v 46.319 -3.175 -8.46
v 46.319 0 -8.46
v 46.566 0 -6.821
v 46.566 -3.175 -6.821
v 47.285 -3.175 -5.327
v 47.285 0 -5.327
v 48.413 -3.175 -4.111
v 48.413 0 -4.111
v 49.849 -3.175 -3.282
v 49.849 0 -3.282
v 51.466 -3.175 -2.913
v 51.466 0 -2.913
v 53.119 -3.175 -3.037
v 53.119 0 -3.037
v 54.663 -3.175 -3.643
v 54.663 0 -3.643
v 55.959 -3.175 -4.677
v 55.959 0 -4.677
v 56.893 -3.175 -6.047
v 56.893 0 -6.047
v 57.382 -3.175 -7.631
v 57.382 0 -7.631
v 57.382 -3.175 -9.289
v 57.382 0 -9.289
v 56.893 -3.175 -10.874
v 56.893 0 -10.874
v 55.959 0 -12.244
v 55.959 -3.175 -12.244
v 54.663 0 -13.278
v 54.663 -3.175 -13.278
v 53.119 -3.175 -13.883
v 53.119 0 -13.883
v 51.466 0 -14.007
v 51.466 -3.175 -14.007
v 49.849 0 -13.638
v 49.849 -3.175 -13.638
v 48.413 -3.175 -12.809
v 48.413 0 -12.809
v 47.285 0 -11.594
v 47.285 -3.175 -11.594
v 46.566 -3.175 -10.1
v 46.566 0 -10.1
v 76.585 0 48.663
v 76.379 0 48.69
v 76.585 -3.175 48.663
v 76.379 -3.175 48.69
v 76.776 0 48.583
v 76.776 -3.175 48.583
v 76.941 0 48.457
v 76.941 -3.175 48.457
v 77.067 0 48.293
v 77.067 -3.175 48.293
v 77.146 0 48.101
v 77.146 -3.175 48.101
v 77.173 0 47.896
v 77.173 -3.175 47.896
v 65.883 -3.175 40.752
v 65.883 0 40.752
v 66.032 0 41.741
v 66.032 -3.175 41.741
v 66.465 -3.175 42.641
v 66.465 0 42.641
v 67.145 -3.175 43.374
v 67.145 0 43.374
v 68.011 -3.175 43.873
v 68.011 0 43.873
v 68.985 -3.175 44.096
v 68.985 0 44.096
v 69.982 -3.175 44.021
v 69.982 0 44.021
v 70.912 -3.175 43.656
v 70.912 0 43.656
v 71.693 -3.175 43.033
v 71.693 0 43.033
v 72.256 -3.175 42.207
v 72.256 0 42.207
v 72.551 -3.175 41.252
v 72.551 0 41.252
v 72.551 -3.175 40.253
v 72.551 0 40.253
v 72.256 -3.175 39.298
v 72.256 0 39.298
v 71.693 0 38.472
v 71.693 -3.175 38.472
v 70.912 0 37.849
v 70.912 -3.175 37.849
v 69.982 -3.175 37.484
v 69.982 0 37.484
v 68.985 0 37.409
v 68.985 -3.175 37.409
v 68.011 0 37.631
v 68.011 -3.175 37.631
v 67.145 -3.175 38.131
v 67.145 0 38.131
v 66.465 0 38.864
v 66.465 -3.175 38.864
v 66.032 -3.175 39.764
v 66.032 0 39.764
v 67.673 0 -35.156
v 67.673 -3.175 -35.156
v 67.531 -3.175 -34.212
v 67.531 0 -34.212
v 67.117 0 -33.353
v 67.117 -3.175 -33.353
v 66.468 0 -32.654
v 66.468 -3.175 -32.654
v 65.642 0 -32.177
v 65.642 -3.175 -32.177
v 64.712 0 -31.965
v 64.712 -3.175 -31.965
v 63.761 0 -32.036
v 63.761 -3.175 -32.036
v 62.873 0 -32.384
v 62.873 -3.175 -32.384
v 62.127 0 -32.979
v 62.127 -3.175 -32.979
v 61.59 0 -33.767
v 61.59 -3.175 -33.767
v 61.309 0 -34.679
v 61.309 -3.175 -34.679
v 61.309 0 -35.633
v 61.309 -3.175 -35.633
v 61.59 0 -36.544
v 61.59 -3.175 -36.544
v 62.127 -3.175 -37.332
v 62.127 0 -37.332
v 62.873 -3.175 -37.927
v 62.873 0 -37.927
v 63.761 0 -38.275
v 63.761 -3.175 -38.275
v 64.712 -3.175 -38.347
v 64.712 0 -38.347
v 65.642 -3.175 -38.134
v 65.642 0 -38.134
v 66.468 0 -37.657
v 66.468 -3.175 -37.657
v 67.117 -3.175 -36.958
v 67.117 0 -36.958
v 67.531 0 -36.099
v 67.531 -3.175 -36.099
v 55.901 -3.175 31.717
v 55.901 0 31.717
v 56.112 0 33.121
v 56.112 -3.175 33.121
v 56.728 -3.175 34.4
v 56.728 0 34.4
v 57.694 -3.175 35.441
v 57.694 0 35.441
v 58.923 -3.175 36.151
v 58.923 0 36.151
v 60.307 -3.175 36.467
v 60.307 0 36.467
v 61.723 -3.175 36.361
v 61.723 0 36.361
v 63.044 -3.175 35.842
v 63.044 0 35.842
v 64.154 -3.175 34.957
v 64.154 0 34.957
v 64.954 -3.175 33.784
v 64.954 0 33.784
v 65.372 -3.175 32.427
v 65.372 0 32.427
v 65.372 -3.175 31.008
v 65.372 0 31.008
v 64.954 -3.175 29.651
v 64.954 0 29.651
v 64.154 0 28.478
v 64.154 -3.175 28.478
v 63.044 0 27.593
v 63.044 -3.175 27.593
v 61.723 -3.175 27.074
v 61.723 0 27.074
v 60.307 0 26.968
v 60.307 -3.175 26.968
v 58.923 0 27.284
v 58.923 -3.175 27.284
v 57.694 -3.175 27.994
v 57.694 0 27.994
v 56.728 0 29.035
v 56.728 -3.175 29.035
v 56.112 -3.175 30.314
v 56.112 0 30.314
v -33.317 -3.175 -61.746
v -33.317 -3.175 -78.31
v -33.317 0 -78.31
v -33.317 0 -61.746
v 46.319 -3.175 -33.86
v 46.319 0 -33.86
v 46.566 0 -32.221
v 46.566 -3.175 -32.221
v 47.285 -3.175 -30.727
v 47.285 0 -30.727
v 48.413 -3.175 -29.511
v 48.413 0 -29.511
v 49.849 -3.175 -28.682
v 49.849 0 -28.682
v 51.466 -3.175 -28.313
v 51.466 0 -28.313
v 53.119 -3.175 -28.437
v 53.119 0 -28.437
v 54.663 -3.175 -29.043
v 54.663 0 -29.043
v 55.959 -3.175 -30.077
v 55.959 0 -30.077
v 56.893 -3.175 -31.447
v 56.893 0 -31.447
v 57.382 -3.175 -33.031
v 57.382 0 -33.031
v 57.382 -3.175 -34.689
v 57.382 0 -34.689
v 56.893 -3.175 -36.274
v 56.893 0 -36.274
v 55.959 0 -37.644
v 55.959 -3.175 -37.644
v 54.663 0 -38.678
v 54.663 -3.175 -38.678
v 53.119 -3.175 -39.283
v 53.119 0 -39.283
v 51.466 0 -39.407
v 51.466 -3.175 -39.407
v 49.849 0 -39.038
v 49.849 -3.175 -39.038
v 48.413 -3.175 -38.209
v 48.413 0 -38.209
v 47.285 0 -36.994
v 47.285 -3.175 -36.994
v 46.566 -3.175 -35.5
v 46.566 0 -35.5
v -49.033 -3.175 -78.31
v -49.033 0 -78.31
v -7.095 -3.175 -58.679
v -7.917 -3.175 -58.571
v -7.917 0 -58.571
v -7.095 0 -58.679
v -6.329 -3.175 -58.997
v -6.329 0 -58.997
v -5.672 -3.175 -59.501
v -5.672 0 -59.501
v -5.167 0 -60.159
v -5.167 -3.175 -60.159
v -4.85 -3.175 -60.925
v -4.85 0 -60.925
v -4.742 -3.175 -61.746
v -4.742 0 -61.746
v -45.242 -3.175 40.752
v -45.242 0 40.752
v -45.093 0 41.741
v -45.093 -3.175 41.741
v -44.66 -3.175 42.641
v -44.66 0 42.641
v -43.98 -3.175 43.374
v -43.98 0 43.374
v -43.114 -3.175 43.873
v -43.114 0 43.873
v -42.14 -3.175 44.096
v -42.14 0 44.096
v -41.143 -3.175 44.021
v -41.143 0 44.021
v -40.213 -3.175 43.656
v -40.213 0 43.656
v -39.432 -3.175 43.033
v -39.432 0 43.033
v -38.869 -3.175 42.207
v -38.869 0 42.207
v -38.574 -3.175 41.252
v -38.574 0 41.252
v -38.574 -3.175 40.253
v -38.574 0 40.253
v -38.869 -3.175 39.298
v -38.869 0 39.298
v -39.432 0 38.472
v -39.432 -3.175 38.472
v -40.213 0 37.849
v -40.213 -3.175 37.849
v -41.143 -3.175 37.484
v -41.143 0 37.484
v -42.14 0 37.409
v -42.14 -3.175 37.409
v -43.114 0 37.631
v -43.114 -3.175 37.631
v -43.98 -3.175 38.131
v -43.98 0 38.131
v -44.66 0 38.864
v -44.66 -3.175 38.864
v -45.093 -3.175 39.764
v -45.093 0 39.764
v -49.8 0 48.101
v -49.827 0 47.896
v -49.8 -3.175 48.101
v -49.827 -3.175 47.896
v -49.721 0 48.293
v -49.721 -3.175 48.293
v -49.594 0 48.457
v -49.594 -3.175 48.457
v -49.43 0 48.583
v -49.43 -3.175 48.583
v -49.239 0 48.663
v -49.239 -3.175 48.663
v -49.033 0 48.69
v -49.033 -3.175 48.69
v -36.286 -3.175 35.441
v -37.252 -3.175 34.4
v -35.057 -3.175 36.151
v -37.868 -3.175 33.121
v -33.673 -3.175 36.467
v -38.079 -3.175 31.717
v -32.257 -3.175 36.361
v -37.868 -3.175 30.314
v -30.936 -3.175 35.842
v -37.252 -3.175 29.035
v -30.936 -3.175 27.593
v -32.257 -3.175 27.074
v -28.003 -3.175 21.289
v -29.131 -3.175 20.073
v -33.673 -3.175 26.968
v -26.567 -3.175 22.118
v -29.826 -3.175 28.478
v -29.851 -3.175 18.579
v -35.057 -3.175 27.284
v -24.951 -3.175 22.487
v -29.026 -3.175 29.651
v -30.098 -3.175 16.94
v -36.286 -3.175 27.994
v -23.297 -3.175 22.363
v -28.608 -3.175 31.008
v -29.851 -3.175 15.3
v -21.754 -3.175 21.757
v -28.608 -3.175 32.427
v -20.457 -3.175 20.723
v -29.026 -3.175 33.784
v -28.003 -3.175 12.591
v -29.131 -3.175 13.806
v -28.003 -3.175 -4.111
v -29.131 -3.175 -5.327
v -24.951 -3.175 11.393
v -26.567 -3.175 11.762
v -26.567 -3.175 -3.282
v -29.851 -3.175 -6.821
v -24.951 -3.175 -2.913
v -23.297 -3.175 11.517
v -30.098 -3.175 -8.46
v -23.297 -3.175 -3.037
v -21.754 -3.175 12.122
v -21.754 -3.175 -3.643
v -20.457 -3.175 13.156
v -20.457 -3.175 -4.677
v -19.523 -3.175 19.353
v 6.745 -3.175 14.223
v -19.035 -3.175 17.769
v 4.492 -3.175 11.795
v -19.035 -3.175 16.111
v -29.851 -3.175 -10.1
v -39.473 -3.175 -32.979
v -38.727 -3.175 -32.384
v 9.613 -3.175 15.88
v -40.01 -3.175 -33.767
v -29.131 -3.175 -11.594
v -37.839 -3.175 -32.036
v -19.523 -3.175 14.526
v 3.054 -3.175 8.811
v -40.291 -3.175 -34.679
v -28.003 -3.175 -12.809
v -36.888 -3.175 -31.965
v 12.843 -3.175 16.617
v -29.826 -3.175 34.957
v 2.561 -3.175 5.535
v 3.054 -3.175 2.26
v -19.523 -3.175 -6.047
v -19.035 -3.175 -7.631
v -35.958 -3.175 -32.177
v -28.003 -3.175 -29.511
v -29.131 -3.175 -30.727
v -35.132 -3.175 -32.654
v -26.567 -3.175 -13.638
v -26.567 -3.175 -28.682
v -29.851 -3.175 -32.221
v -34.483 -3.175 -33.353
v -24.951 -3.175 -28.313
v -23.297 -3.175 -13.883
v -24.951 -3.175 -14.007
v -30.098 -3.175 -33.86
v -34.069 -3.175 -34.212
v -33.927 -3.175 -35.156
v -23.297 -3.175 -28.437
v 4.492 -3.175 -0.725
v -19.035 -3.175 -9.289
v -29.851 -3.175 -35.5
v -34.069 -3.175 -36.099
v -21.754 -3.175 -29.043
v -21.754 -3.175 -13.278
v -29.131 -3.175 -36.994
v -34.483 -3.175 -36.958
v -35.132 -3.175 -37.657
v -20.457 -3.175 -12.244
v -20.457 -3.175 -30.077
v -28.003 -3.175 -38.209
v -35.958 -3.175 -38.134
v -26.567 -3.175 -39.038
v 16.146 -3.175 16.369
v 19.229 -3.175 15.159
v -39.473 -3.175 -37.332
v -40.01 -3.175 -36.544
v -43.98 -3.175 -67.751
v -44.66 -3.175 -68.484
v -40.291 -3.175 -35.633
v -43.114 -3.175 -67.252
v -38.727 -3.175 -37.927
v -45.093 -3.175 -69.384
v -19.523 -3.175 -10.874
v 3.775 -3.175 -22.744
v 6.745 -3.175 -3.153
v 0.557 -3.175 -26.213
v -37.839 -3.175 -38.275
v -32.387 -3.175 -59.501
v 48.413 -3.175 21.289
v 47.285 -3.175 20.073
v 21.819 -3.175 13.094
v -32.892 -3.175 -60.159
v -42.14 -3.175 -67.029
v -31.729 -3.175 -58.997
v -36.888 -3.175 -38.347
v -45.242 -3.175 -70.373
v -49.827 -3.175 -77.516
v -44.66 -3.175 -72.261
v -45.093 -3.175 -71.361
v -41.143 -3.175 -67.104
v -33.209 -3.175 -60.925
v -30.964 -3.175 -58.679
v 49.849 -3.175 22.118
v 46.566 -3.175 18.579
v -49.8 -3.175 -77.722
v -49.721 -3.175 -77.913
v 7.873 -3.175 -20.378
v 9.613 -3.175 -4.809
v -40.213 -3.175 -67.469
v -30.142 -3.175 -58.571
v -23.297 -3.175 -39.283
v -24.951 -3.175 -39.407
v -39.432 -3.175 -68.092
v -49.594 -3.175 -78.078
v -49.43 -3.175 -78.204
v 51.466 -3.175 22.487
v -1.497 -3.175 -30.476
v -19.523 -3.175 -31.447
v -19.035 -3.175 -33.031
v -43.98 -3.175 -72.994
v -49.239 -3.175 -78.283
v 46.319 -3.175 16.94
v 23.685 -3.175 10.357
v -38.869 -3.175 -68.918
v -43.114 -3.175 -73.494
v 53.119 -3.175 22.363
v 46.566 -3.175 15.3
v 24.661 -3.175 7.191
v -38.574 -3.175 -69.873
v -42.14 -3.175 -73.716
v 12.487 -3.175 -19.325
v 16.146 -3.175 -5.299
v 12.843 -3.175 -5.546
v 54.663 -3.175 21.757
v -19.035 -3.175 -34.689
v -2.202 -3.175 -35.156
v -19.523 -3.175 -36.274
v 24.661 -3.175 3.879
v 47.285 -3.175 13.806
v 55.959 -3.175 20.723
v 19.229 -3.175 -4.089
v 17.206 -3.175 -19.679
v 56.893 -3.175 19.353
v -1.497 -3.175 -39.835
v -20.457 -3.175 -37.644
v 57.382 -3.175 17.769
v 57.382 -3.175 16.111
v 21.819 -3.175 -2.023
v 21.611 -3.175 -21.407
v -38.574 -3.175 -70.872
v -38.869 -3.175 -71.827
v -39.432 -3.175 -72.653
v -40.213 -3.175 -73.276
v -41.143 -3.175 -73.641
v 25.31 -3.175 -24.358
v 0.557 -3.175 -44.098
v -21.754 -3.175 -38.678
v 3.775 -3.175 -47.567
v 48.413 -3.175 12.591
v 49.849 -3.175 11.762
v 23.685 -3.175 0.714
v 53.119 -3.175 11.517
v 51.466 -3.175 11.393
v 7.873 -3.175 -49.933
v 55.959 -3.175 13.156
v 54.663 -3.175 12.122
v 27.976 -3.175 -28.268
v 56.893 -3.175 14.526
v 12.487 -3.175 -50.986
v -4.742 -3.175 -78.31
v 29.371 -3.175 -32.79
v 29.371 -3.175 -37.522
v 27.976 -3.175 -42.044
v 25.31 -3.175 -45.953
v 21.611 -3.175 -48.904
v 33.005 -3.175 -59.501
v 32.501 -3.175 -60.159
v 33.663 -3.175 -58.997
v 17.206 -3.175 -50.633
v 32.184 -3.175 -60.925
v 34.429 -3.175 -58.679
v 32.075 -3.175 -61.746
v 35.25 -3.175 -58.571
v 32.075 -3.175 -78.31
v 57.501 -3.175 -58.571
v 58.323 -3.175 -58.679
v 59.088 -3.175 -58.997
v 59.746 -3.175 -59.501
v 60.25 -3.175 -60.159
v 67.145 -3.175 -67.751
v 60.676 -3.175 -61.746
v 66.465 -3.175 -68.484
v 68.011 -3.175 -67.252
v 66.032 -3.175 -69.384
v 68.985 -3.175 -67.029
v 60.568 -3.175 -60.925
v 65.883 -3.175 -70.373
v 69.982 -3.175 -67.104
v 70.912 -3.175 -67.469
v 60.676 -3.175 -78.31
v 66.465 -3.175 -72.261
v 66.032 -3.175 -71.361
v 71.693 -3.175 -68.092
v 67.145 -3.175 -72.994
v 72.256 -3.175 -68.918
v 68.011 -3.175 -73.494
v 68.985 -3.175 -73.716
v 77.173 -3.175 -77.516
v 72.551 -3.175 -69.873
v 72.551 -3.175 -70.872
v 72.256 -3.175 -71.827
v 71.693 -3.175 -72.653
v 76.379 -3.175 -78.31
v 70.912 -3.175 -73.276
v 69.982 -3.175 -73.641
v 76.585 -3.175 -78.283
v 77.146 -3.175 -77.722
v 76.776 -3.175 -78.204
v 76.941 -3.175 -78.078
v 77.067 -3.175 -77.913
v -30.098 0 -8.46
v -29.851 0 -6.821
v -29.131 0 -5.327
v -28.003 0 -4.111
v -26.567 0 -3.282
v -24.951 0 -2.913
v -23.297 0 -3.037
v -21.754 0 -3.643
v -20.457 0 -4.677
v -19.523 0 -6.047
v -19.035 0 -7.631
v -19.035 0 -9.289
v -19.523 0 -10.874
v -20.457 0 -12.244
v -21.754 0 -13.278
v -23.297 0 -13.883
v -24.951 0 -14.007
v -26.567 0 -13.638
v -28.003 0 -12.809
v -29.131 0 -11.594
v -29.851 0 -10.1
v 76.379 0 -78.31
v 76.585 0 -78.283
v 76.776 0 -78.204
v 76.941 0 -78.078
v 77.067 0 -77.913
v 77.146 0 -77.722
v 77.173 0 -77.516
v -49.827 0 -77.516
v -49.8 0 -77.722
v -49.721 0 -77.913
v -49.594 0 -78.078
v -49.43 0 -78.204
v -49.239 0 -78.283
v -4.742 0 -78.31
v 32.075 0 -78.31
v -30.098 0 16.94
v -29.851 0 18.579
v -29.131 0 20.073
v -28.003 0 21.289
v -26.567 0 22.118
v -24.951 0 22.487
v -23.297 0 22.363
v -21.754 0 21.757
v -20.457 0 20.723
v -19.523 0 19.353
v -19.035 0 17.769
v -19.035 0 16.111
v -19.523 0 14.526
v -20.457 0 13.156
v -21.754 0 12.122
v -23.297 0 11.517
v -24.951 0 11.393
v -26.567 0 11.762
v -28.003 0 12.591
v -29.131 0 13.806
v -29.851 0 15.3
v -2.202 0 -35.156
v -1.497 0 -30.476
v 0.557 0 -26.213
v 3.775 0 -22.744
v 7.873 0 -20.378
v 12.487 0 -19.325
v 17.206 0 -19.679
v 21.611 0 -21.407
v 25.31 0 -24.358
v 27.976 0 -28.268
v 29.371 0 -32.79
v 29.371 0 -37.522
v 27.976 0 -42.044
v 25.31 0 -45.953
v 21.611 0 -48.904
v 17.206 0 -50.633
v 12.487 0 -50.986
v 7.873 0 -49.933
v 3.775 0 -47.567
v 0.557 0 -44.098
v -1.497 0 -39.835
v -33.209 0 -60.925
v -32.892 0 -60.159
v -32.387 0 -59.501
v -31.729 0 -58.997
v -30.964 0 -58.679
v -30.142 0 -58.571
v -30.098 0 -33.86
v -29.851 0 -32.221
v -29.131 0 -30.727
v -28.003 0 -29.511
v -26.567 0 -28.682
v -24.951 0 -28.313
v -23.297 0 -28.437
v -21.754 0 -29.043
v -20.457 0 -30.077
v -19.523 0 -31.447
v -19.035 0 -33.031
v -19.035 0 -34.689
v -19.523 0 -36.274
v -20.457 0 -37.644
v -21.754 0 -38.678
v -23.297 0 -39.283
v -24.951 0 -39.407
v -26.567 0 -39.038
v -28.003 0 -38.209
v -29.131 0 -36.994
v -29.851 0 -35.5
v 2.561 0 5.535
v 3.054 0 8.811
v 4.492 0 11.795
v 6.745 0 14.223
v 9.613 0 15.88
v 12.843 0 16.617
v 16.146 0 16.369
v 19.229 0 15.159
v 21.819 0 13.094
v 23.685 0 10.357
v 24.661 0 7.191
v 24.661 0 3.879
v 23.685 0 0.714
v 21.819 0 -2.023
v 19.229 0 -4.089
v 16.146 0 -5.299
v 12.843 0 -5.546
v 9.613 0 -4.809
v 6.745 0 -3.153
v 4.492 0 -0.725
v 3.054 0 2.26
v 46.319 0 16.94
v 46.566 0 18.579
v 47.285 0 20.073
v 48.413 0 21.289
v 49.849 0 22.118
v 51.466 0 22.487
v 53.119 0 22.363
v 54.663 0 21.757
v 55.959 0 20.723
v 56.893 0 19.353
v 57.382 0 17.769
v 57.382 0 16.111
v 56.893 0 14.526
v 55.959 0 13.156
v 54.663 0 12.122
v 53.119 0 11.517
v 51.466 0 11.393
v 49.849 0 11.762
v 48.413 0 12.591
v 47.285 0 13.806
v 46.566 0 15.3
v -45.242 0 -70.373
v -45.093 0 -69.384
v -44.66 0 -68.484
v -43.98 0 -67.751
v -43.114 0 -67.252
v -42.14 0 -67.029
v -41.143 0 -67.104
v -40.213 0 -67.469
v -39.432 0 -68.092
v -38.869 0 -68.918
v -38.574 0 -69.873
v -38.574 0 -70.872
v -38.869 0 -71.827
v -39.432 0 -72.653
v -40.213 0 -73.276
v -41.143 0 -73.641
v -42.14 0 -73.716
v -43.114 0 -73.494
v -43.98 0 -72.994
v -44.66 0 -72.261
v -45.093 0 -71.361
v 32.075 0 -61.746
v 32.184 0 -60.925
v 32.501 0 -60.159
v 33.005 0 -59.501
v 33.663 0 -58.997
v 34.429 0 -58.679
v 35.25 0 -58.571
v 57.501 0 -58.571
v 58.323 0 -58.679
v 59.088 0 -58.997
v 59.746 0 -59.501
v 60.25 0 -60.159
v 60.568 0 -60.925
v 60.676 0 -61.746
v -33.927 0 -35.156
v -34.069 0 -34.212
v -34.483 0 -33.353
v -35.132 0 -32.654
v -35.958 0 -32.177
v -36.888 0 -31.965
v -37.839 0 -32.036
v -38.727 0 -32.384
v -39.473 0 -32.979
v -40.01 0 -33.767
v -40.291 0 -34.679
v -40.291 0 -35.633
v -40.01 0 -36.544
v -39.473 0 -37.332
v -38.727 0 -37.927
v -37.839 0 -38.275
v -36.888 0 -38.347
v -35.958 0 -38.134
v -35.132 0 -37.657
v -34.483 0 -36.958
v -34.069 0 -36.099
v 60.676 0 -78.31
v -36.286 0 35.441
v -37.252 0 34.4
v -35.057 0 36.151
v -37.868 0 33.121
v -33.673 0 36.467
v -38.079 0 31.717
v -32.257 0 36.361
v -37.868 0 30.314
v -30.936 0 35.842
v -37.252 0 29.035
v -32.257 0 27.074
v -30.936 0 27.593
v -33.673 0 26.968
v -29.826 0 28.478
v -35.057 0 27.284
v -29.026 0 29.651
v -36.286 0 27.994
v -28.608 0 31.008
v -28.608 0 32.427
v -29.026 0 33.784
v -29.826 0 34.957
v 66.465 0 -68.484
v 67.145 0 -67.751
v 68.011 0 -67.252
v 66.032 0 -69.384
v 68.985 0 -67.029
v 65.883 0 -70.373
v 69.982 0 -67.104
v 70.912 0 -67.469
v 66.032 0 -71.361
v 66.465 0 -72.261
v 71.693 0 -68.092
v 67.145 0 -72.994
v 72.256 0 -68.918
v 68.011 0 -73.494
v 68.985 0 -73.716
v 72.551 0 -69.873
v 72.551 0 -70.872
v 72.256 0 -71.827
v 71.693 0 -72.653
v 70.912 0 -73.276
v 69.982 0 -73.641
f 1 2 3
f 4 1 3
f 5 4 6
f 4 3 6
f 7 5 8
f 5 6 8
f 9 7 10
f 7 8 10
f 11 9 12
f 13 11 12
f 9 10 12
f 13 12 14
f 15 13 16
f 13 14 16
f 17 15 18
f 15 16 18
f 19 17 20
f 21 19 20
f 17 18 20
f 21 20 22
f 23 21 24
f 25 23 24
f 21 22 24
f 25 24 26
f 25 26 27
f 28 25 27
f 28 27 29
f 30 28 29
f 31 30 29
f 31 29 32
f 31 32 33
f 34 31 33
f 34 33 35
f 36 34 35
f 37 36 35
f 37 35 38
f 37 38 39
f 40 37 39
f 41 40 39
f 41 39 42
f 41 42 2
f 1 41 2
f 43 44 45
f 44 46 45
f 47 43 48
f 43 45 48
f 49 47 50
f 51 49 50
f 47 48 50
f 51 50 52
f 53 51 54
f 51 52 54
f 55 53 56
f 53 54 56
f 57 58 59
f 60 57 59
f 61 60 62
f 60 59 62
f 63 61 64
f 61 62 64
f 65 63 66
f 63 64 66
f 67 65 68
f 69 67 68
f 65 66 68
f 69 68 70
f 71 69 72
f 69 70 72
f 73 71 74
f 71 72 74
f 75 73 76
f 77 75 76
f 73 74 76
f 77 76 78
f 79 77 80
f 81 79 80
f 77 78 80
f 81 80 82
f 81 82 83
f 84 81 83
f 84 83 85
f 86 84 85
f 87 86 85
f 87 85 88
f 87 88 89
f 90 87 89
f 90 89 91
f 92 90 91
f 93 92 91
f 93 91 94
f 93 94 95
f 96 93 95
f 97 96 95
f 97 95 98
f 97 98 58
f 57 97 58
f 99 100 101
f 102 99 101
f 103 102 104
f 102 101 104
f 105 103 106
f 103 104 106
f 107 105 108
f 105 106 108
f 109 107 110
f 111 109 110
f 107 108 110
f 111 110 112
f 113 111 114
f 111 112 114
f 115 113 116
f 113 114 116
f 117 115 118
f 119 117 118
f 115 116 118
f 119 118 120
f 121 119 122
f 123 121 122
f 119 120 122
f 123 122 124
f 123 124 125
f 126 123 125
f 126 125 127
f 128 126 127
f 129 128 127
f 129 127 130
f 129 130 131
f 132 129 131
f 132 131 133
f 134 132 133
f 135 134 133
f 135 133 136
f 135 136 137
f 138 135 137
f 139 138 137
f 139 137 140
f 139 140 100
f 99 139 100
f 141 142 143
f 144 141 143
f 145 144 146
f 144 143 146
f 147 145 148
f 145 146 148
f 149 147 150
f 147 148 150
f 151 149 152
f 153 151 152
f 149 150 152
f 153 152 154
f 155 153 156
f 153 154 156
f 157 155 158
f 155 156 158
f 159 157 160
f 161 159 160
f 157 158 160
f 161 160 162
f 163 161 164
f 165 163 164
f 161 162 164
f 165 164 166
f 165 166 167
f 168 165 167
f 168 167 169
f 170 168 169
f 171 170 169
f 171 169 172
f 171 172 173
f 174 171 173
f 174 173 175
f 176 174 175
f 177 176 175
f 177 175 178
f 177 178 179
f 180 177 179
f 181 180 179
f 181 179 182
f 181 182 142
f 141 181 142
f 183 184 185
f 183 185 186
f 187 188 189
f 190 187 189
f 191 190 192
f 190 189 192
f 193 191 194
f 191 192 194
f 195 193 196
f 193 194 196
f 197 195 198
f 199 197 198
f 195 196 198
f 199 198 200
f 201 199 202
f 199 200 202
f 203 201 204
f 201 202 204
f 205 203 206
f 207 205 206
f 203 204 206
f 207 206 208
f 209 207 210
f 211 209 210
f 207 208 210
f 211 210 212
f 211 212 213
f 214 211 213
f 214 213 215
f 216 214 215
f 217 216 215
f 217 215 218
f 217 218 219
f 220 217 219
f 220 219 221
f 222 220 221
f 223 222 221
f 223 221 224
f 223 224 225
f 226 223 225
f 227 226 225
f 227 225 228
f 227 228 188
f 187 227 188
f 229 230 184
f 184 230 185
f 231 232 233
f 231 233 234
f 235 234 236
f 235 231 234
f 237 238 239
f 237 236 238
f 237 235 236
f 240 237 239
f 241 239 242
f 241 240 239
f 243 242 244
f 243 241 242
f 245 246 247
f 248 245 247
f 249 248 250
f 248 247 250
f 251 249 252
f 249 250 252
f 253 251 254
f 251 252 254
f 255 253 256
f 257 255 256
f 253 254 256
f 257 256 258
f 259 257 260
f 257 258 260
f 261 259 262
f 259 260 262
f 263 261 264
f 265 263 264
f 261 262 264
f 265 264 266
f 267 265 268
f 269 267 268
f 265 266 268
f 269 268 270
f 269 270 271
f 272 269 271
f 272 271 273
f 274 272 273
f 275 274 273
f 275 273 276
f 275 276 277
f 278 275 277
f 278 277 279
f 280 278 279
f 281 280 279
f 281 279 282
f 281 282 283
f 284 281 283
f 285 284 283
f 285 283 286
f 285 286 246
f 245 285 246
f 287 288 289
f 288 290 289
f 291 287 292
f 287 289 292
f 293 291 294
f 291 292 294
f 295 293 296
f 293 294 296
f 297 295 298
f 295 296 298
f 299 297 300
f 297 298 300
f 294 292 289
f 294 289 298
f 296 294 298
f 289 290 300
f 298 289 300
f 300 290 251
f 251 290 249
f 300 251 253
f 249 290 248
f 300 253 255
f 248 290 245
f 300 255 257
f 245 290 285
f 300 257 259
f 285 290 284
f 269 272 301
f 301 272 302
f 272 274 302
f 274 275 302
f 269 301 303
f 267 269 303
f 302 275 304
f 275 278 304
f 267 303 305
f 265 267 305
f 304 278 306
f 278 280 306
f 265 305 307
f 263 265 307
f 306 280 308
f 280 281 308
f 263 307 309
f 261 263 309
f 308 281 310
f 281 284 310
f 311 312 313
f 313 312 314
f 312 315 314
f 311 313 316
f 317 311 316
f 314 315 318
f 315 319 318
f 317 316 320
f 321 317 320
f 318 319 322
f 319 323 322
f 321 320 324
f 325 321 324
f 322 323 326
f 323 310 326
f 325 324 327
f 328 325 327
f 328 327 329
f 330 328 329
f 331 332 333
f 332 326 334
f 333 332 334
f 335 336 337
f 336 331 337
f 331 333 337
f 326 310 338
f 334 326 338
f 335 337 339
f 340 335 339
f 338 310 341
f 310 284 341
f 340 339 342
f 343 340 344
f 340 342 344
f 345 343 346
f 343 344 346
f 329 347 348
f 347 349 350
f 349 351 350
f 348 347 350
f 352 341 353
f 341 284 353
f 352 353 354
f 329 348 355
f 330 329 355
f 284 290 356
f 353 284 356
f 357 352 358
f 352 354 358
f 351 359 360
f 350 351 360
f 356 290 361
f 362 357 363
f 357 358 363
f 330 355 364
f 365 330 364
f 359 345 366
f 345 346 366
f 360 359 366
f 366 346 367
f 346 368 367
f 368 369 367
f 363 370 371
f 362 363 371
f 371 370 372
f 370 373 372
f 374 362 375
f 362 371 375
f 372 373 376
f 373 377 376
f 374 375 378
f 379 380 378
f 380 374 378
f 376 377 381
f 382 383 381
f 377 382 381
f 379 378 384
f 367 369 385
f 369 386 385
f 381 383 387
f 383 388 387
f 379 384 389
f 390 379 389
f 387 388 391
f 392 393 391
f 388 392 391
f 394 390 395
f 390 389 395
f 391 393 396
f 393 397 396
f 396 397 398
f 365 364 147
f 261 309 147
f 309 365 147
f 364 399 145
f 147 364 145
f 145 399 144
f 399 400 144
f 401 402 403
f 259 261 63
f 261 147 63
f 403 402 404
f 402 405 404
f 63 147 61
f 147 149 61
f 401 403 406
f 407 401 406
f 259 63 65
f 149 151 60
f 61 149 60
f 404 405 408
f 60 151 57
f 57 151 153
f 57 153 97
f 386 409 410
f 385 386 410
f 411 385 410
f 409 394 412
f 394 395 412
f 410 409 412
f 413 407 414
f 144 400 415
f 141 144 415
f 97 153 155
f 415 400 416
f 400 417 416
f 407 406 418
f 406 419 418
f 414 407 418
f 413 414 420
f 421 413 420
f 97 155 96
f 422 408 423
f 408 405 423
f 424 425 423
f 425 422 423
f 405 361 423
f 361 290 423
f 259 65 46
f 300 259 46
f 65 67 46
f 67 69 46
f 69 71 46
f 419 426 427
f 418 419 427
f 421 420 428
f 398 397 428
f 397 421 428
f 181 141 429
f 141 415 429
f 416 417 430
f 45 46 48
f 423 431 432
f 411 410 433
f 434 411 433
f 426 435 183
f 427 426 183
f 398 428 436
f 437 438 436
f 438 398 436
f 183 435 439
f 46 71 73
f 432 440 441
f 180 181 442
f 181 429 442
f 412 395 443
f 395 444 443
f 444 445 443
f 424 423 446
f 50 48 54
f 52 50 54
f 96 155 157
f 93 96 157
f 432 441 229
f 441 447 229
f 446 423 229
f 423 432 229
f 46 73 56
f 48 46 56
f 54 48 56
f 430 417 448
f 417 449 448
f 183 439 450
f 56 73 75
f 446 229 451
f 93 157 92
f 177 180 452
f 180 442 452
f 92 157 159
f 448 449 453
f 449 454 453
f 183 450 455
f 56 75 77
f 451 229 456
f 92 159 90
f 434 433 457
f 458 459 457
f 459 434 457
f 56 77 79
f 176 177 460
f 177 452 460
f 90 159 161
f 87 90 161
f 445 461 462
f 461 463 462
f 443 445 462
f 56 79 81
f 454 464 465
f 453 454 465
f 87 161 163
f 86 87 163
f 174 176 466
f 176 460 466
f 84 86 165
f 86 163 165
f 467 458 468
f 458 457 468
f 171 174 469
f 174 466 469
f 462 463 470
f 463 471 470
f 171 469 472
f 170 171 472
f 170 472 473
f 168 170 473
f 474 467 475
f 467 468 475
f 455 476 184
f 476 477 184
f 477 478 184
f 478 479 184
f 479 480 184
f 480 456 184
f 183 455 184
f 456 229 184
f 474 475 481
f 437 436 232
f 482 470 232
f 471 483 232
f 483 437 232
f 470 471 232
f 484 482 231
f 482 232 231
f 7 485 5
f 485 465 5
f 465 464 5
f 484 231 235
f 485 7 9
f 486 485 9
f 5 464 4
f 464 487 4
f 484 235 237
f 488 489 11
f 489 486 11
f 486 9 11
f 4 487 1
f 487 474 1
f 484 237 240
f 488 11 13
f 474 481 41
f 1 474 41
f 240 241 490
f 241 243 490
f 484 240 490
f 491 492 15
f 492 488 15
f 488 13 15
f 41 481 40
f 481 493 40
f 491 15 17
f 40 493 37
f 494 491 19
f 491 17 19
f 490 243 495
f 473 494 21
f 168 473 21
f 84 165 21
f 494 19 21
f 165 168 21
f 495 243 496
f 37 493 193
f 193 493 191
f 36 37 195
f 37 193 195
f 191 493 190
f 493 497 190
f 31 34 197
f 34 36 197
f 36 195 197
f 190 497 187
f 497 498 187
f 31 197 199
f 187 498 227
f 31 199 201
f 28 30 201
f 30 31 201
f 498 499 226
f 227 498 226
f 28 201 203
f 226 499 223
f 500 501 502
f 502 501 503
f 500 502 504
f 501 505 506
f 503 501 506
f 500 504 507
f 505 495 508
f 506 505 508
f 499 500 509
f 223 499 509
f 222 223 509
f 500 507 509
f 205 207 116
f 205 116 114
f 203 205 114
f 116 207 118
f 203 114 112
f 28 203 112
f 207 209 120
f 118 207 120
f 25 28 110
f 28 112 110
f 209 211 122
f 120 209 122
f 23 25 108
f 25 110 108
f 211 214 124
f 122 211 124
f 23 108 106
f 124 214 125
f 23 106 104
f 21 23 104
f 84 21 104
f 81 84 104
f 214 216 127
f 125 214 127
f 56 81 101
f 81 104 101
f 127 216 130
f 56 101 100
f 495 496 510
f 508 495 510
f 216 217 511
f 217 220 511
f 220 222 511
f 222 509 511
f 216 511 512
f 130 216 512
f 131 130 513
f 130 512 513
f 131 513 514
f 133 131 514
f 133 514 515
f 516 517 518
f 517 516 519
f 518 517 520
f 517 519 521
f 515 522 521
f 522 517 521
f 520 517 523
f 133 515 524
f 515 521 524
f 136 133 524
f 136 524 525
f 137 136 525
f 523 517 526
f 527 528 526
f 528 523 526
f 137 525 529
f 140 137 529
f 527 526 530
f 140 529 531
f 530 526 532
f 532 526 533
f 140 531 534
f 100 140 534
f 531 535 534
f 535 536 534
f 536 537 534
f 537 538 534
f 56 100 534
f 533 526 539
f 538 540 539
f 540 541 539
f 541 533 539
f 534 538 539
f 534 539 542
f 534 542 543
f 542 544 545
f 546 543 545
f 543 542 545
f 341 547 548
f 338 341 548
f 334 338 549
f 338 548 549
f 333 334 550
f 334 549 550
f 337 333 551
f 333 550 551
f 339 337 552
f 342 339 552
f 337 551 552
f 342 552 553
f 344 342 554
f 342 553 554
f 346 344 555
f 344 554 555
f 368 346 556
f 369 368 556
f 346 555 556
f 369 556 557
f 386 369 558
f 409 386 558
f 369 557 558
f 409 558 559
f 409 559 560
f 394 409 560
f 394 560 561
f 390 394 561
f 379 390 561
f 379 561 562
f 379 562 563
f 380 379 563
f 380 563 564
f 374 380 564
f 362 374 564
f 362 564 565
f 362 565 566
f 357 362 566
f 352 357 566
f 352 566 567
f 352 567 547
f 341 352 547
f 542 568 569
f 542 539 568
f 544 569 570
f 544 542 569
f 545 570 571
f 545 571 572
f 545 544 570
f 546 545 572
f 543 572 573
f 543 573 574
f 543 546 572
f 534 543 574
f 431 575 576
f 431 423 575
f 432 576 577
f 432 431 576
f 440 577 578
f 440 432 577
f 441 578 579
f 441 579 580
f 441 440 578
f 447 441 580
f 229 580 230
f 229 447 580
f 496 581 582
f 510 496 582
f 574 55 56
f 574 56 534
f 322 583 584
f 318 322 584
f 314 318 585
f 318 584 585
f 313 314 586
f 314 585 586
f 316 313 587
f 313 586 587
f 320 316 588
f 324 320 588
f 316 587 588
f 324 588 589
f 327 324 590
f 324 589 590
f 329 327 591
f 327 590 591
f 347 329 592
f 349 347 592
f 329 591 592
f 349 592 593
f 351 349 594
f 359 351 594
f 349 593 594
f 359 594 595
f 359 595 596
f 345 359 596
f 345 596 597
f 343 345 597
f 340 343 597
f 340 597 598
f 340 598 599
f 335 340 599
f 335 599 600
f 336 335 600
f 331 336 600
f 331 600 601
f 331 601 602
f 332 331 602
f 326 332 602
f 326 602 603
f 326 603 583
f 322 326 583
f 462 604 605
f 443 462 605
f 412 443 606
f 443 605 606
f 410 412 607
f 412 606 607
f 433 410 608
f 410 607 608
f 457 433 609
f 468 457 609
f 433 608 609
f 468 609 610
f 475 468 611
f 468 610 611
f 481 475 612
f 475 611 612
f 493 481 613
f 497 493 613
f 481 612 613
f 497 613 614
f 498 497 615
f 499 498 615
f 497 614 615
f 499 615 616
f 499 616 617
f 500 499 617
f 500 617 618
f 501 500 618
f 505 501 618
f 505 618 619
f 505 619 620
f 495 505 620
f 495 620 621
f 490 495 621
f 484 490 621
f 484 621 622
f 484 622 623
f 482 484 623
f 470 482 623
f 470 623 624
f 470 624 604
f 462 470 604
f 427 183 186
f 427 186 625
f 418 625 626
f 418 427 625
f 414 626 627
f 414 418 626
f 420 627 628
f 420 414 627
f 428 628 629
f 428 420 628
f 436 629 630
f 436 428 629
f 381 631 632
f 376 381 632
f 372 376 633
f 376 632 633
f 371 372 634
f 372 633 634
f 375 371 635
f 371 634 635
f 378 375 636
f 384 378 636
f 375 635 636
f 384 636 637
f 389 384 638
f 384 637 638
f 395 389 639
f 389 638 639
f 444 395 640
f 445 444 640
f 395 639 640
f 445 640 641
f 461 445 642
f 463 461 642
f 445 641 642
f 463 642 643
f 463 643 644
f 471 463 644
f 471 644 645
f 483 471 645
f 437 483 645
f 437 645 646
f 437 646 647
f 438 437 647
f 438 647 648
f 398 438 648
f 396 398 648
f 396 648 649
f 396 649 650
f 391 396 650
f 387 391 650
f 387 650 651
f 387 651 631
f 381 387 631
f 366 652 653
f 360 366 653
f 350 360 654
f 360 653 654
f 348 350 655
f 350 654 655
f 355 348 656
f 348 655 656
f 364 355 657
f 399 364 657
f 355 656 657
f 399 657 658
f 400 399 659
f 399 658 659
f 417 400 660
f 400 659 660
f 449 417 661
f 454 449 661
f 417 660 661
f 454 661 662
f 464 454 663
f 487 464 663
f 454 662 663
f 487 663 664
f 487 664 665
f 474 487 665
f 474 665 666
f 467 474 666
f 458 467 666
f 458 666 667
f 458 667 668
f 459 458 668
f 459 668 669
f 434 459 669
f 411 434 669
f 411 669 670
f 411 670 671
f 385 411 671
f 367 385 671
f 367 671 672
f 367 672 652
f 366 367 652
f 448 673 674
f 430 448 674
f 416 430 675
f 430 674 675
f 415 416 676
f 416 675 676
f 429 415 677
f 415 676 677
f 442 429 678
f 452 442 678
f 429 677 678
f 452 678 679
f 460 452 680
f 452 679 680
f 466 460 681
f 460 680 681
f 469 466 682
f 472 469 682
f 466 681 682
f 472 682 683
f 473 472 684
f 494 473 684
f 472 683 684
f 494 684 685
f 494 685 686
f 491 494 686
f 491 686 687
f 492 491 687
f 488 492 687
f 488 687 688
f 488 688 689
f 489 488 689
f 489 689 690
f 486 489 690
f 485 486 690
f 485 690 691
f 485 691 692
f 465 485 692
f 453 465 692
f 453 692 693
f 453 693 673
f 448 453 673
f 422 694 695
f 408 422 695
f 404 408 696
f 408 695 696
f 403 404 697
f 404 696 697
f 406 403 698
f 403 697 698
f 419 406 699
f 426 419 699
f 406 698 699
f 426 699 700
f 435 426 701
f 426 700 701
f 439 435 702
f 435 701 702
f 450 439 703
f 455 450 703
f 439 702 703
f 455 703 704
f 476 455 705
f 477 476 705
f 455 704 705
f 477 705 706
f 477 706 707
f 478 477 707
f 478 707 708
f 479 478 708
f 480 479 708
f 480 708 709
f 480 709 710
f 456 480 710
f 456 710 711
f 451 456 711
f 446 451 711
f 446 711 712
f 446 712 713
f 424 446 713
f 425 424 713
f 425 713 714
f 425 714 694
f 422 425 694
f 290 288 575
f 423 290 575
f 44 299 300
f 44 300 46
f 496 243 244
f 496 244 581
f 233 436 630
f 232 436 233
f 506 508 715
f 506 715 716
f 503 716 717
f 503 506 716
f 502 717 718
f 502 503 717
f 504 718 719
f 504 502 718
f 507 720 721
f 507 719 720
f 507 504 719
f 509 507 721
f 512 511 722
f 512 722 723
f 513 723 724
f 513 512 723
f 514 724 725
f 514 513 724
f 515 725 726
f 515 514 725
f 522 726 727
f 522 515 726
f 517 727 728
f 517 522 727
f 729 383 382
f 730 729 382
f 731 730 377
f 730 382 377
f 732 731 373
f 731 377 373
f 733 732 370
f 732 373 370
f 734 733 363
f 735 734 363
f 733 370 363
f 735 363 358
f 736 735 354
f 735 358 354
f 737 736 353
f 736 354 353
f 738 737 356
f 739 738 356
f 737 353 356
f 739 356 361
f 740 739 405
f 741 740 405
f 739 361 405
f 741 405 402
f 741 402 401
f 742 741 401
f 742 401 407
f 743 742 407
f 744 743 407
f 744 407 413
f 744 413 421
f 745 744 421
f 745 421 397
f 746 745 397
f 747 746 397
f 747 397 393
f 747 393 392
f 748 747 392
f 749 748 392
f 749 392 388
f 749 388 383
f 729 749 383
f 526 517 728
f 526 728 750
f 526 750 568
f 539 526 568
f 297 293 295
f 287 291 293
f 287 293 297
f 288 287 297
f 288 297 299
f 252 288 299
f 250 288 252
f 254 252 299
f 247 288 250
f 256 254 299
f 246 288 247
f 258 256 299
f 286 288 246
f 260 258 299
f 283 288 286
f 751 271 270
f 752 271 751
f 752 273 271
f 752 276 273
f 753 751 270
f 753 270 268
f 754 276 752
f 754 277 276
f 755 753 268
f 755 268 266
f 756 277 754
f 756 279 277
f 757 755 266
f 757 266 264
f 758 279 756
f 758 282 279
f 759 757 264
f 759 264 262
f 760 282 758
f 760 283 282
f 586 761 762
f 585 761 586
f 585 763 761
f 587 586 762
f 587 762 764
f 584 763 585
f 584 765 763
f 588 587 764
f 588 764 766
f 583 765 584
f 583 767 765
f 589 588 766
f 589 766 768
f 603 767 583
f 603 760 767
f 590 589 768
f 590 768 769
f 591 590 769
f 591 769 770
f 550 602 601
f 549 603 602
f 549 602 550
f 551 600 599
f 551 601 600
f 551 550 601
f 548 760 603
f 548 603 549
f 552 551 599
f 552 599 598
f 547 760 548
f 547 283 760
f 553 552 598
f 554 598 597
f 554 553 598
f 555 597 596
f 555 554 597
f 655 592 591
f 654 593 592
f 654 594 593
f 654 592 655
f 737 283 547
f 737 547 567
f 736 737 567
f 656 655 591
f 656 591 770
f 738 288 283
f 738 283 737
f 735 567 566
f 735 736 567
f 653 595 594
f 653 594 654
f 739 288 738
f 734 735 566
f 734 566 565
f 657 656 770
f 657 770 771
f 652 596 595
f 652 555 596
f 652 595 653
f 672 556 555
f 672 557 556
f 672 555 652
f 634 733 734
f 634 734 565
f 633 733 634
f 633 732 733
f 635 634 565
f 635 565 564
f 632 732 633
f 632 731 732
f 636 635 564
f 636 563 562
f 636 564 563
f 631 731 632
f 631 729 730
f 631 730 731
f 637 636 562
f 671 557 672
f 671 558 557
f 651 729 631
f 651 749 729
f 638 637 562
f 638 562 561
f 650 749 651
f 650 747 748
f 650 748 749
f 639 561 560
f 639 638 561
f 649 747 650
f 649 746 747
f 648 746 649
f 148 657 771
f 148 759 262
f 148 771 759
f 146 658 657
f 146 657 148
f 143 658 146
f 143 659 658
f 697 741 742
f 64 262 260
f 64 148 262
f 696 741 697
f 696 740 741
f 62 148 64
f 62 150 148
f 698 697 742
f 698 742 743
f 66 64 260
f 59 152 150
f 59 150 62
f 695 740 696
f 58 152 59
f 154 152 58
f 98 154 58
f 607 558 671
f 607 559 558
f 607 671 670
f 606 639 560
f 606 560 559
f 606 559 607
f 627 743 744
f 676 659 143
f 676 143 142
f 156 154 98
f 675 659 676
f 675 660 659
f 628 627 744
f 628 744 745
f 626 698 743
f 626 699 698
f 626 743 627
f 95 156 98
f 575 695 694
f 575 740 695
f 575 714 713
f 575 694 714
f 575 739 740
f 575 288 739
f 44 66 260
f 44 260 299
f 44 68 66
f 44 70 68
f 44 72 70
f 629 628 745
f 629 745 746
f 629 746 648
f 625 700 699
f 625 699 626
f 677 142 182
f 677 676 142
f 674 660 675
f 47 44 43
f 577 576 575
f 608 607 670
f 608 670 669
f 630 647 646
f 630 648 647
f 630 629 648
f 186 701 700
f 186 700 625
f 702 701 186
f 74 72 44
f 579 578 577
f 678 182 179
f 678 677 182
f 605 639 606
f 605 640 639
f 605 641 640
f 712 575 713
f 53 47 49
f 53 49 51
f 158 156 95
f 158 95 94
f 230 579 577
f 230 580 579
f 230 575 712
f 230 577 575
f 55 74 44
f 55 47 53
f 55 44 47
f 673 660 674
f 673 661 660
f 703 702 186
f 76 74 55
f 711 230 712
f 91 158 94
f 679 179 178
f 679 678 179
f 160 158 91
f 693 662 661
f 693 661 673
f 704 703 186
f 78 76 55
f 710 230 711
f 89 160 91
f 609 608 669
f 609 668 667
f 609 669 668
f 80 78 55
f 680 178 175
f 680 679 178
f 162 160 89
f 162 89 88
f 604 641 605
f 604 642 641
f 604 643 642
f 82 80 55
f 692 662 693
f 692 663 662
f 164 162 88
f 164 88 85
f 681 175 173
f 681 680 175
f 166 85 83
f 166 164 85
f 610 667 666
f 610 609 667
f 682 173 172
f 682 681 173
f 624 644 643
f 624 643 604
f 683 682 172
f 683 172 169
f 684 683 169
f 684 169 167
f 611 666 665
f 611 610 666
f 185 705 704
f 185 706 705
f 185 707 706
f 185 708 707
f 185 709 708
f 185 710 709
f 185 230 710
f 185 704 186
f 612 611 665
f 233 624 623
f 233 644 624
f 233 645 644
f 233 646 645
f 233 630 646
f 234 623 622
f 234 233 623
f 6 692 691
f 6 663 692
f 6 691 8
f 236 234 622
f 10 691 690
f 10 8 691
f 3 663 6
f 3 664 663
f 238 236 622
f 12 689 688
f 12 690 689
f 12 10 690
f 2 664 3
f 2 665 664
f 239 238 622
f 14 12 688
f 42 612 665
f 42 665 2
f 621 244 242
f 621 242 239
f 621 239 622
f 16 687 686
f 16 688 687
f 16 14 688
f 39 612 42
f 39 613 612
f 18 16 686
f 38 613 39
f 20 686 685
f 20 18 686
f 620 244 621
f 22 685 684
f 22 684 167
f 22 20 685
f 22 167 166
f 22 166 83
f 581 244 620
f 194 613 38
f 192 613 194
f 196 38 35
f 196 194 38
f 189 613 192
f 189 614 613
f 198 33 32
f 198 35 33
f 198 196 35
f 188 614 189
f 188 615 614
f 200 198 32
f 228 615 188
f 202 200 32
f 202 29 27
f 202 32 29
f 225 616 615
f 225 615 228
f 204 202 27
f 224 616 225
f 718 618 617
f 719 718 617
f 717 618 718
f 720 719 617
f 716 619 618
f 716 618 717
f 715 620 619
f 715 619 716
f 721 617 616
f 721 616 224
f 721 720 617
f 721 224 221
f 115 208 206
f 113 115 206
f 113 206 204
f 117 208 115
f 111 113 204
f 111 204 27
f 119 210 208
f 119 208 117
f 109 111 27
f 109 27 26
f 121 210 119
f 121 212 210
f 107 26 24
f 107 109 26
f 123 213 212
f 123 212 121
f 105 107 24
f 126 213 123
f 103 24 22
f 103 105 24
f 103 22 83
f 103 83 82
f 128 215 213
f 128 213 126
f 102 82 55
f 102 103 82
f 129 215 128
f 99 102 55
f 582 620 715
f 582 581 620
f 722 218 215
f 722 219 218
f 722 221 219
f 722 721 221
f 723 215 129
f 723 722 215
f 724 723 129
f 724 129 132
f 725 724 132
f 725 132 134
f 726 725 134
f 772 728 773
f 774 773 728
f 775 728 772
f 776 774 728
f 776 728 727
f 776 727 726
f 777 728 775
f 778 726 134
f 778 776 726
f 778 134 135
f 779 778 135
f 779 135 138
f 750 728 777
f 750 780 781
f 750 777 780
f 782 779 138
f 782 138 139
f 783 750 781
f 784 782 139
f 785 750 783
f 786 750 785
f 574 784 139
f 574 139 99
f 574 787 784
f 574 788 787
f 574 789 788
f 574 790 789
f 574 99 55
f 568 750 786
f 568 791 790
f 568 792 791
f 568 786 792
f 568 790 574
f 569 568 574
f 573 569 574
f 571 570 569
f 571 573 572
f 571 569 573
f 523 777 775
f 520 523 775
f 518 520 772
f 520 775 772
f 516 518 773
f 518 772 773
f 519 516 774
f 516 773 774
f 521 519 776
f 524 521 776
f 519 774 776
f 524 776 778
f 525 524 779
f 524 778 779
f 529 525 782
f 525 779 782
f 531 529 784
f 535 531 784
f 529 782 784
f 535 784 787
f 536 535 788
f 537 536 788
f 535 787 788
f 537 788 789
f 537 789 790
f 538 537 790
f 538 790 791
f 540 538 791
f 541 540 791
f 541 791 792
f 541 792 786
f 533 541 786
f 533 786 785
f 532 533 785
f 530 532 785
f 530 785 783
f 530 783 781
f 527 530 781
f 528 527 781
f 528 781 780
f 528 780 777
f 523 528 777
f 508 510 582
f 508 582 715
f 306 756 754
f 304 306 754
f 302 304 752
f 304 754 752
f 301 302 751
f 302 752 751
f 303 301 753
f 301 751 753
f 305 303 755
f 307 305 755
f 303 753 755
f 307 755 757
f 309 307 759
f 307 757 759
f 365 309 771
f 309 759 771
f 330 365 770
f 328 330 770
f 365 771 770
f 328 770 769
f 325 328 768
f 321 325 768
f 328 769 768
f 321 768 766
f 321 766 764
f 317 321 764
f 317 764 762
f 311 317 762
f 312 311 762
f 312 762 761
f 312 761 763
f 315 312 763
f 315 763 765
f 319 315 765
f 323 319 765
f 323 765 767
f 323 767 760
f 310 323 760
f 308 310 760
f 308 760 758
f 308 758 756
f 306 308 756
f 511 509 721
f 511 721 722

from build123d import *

# Parameters (mm, degrees)
SKETCH1_W                    = 127
SKETCH1_H                    = 127
BOSS_EXTRUDE1_DEPTH          = 3.175
M20_CLEARANCE_HOLE1_D        = 22.225
M6_CLEARANCE_HOLE1_D         = 6.7056
HOLE1_D                      = 31.75
M10_CLEARANCE_HOLE1_D        = 11.1252
FILLET1_R                    = 0.79375
M6_CLEARANCE_HOLE2_D         = 6.4
CUT_EXTRUDE1_DEPTH           = 110.992087544
F_3_8_0_375_DIAMETER_HOLE1_D = 9.525


with BuildPart() as part:
    # Sketch1 → Boss-Extrude1 (new body)
    with BuildSketch(Plane(origin=(0, 0, 0), x_dir=(1, 0, 0), z_dir=(0, 1, 0))):
        with Locations((13.673098237, 14.8102267)):
            Rectangle(SKETCH1_W, SKETCH1_H)
    extrude(amount=-BOSS_EXTRUDE1_DEPTH)

    # M20 Clearance Hole1 (through all)
    with Locations(Plane.XZ.offset(3.175)):
        with Locations((13.673098237, 5.5351733)):
            Hole(M20_CLEARANCE_HOLE1_D / 2)

    # M6 Clearance Hole1 (through all)
    with Locations(Plane.XZ.offset(3.175)):
        with Locations((-41.889401763, -70.3727267), (69.235598237, 40.7522733), (69.235598237, -70.3727267), (-41.889401763, 40.7522733)):
            Hole(M6_CLEARANCE_HOLE1_D / 2)

    # Hole1 (through all)
    with Locations(Plane.XZ.offset(3.175)):
        with Locations((13.673098237, -35.1556267)):
            Hole(HOLE1_D / 2)

    # M10 Clearance Hole1 (through all)
    with Locations(Plane.XZ.offset(3.175)):
        with Locations((-24.535146731, -33.8602267), (51.881343204, 16.9397733), (-24.535146731, -8.4602267), (-24.535146731, 16.9397733), (51.881343204, -33.8602267), (51.881343204, -8.4602267)):
            Hole(M10_CLEARANCE_HOLE1_D / 2)

    # Fillet1
    fillet1_edges = [part.edges().sort_by_distance(p)[0] for p in [
        (77.173098237, -1.5875, -78.3102267),
        (77.173098237, -1.5875, 48.6897733),
        (-49.826901763, -1.5875, 48.6897733),
        (-49.826901763, -1.5875, -78.3102267),
    ]]
    fillet(fillet1_edges, radius=FILLET1_R)

    # M6 Clearance Hole2 (through all)
    with Locations(Plane(origin=(0, 0, 0), x_dir=(-1, 0, 0), z_dir=(0, 1, 0))):
        with Locations((-64.473098237, -35.1556267), (37.126901763, -35.1556267)):
            Hole(M6_CLEARANCE_HOLE2_D / 2)

    # Sketch12 → Cut-Extrude1 (cut, through all)
    with BuildSketch(Plane.XZ.offset(3.175)):
        with BuildLine():
            Line((-33.316901763, -78.3102267), (-33.316901763, -61.7462517))
            ThreePointArc((-33.316901763, -61.7462517), (-32.386965793, -59.50118767), (-30.141901763, -58.5712517))
            Line((-30.141901763, -58.5712517), (-7.916901763, -58.5712517))
            ThreePointArc((-7.916901763, -58.5712517), (-5.671837733, -59.50118767), (-4.741901763, -61.7462517))
            Line((-4.741901763, -61.7462517), (-4.741901763, -78.3102267))
            Line((-4.741901763, -78.3102267), (-33.316901763, -78.3102267))
        make_face()
        with BuildLine():
            Line((32.075398237, -78.3102267), (32.075398237, -61.7462517))
            ThreePointArc((32.075398237, -61.7462517), (33.005334207, -59.50118767), (35.250398237, -58.5712517))
            Line((35.250398237, -58.5712517), (57.500798237, -58.5712517))
            ThreePointArc((57.500798237, -58.5712517), (59.745862267, -59.50118767), (60.675798237, -61.7462517))
            Line((60.675798237, -61.7462517), (60.675798237, -78.3102267))
            Line((60.675798237, -78.3102267), (32.075398237, -78.3102267))
        make_face()
    extrude(amount=-CUT_EXTRUDE1_DEPTH, mode=Mode.SUBTRACT)

    # 3/8 (0.375) Diameter Hole1 (through all)
    with Locations(Plane.XZ.offset(3.175)):
        with Locations((60.663098237, 31.717491348), (-33.316901763, 31.717491348)):
            Hole(F_3_8_0_375_DIAMETER_HOLE1_D / 2)


solid = part.part
